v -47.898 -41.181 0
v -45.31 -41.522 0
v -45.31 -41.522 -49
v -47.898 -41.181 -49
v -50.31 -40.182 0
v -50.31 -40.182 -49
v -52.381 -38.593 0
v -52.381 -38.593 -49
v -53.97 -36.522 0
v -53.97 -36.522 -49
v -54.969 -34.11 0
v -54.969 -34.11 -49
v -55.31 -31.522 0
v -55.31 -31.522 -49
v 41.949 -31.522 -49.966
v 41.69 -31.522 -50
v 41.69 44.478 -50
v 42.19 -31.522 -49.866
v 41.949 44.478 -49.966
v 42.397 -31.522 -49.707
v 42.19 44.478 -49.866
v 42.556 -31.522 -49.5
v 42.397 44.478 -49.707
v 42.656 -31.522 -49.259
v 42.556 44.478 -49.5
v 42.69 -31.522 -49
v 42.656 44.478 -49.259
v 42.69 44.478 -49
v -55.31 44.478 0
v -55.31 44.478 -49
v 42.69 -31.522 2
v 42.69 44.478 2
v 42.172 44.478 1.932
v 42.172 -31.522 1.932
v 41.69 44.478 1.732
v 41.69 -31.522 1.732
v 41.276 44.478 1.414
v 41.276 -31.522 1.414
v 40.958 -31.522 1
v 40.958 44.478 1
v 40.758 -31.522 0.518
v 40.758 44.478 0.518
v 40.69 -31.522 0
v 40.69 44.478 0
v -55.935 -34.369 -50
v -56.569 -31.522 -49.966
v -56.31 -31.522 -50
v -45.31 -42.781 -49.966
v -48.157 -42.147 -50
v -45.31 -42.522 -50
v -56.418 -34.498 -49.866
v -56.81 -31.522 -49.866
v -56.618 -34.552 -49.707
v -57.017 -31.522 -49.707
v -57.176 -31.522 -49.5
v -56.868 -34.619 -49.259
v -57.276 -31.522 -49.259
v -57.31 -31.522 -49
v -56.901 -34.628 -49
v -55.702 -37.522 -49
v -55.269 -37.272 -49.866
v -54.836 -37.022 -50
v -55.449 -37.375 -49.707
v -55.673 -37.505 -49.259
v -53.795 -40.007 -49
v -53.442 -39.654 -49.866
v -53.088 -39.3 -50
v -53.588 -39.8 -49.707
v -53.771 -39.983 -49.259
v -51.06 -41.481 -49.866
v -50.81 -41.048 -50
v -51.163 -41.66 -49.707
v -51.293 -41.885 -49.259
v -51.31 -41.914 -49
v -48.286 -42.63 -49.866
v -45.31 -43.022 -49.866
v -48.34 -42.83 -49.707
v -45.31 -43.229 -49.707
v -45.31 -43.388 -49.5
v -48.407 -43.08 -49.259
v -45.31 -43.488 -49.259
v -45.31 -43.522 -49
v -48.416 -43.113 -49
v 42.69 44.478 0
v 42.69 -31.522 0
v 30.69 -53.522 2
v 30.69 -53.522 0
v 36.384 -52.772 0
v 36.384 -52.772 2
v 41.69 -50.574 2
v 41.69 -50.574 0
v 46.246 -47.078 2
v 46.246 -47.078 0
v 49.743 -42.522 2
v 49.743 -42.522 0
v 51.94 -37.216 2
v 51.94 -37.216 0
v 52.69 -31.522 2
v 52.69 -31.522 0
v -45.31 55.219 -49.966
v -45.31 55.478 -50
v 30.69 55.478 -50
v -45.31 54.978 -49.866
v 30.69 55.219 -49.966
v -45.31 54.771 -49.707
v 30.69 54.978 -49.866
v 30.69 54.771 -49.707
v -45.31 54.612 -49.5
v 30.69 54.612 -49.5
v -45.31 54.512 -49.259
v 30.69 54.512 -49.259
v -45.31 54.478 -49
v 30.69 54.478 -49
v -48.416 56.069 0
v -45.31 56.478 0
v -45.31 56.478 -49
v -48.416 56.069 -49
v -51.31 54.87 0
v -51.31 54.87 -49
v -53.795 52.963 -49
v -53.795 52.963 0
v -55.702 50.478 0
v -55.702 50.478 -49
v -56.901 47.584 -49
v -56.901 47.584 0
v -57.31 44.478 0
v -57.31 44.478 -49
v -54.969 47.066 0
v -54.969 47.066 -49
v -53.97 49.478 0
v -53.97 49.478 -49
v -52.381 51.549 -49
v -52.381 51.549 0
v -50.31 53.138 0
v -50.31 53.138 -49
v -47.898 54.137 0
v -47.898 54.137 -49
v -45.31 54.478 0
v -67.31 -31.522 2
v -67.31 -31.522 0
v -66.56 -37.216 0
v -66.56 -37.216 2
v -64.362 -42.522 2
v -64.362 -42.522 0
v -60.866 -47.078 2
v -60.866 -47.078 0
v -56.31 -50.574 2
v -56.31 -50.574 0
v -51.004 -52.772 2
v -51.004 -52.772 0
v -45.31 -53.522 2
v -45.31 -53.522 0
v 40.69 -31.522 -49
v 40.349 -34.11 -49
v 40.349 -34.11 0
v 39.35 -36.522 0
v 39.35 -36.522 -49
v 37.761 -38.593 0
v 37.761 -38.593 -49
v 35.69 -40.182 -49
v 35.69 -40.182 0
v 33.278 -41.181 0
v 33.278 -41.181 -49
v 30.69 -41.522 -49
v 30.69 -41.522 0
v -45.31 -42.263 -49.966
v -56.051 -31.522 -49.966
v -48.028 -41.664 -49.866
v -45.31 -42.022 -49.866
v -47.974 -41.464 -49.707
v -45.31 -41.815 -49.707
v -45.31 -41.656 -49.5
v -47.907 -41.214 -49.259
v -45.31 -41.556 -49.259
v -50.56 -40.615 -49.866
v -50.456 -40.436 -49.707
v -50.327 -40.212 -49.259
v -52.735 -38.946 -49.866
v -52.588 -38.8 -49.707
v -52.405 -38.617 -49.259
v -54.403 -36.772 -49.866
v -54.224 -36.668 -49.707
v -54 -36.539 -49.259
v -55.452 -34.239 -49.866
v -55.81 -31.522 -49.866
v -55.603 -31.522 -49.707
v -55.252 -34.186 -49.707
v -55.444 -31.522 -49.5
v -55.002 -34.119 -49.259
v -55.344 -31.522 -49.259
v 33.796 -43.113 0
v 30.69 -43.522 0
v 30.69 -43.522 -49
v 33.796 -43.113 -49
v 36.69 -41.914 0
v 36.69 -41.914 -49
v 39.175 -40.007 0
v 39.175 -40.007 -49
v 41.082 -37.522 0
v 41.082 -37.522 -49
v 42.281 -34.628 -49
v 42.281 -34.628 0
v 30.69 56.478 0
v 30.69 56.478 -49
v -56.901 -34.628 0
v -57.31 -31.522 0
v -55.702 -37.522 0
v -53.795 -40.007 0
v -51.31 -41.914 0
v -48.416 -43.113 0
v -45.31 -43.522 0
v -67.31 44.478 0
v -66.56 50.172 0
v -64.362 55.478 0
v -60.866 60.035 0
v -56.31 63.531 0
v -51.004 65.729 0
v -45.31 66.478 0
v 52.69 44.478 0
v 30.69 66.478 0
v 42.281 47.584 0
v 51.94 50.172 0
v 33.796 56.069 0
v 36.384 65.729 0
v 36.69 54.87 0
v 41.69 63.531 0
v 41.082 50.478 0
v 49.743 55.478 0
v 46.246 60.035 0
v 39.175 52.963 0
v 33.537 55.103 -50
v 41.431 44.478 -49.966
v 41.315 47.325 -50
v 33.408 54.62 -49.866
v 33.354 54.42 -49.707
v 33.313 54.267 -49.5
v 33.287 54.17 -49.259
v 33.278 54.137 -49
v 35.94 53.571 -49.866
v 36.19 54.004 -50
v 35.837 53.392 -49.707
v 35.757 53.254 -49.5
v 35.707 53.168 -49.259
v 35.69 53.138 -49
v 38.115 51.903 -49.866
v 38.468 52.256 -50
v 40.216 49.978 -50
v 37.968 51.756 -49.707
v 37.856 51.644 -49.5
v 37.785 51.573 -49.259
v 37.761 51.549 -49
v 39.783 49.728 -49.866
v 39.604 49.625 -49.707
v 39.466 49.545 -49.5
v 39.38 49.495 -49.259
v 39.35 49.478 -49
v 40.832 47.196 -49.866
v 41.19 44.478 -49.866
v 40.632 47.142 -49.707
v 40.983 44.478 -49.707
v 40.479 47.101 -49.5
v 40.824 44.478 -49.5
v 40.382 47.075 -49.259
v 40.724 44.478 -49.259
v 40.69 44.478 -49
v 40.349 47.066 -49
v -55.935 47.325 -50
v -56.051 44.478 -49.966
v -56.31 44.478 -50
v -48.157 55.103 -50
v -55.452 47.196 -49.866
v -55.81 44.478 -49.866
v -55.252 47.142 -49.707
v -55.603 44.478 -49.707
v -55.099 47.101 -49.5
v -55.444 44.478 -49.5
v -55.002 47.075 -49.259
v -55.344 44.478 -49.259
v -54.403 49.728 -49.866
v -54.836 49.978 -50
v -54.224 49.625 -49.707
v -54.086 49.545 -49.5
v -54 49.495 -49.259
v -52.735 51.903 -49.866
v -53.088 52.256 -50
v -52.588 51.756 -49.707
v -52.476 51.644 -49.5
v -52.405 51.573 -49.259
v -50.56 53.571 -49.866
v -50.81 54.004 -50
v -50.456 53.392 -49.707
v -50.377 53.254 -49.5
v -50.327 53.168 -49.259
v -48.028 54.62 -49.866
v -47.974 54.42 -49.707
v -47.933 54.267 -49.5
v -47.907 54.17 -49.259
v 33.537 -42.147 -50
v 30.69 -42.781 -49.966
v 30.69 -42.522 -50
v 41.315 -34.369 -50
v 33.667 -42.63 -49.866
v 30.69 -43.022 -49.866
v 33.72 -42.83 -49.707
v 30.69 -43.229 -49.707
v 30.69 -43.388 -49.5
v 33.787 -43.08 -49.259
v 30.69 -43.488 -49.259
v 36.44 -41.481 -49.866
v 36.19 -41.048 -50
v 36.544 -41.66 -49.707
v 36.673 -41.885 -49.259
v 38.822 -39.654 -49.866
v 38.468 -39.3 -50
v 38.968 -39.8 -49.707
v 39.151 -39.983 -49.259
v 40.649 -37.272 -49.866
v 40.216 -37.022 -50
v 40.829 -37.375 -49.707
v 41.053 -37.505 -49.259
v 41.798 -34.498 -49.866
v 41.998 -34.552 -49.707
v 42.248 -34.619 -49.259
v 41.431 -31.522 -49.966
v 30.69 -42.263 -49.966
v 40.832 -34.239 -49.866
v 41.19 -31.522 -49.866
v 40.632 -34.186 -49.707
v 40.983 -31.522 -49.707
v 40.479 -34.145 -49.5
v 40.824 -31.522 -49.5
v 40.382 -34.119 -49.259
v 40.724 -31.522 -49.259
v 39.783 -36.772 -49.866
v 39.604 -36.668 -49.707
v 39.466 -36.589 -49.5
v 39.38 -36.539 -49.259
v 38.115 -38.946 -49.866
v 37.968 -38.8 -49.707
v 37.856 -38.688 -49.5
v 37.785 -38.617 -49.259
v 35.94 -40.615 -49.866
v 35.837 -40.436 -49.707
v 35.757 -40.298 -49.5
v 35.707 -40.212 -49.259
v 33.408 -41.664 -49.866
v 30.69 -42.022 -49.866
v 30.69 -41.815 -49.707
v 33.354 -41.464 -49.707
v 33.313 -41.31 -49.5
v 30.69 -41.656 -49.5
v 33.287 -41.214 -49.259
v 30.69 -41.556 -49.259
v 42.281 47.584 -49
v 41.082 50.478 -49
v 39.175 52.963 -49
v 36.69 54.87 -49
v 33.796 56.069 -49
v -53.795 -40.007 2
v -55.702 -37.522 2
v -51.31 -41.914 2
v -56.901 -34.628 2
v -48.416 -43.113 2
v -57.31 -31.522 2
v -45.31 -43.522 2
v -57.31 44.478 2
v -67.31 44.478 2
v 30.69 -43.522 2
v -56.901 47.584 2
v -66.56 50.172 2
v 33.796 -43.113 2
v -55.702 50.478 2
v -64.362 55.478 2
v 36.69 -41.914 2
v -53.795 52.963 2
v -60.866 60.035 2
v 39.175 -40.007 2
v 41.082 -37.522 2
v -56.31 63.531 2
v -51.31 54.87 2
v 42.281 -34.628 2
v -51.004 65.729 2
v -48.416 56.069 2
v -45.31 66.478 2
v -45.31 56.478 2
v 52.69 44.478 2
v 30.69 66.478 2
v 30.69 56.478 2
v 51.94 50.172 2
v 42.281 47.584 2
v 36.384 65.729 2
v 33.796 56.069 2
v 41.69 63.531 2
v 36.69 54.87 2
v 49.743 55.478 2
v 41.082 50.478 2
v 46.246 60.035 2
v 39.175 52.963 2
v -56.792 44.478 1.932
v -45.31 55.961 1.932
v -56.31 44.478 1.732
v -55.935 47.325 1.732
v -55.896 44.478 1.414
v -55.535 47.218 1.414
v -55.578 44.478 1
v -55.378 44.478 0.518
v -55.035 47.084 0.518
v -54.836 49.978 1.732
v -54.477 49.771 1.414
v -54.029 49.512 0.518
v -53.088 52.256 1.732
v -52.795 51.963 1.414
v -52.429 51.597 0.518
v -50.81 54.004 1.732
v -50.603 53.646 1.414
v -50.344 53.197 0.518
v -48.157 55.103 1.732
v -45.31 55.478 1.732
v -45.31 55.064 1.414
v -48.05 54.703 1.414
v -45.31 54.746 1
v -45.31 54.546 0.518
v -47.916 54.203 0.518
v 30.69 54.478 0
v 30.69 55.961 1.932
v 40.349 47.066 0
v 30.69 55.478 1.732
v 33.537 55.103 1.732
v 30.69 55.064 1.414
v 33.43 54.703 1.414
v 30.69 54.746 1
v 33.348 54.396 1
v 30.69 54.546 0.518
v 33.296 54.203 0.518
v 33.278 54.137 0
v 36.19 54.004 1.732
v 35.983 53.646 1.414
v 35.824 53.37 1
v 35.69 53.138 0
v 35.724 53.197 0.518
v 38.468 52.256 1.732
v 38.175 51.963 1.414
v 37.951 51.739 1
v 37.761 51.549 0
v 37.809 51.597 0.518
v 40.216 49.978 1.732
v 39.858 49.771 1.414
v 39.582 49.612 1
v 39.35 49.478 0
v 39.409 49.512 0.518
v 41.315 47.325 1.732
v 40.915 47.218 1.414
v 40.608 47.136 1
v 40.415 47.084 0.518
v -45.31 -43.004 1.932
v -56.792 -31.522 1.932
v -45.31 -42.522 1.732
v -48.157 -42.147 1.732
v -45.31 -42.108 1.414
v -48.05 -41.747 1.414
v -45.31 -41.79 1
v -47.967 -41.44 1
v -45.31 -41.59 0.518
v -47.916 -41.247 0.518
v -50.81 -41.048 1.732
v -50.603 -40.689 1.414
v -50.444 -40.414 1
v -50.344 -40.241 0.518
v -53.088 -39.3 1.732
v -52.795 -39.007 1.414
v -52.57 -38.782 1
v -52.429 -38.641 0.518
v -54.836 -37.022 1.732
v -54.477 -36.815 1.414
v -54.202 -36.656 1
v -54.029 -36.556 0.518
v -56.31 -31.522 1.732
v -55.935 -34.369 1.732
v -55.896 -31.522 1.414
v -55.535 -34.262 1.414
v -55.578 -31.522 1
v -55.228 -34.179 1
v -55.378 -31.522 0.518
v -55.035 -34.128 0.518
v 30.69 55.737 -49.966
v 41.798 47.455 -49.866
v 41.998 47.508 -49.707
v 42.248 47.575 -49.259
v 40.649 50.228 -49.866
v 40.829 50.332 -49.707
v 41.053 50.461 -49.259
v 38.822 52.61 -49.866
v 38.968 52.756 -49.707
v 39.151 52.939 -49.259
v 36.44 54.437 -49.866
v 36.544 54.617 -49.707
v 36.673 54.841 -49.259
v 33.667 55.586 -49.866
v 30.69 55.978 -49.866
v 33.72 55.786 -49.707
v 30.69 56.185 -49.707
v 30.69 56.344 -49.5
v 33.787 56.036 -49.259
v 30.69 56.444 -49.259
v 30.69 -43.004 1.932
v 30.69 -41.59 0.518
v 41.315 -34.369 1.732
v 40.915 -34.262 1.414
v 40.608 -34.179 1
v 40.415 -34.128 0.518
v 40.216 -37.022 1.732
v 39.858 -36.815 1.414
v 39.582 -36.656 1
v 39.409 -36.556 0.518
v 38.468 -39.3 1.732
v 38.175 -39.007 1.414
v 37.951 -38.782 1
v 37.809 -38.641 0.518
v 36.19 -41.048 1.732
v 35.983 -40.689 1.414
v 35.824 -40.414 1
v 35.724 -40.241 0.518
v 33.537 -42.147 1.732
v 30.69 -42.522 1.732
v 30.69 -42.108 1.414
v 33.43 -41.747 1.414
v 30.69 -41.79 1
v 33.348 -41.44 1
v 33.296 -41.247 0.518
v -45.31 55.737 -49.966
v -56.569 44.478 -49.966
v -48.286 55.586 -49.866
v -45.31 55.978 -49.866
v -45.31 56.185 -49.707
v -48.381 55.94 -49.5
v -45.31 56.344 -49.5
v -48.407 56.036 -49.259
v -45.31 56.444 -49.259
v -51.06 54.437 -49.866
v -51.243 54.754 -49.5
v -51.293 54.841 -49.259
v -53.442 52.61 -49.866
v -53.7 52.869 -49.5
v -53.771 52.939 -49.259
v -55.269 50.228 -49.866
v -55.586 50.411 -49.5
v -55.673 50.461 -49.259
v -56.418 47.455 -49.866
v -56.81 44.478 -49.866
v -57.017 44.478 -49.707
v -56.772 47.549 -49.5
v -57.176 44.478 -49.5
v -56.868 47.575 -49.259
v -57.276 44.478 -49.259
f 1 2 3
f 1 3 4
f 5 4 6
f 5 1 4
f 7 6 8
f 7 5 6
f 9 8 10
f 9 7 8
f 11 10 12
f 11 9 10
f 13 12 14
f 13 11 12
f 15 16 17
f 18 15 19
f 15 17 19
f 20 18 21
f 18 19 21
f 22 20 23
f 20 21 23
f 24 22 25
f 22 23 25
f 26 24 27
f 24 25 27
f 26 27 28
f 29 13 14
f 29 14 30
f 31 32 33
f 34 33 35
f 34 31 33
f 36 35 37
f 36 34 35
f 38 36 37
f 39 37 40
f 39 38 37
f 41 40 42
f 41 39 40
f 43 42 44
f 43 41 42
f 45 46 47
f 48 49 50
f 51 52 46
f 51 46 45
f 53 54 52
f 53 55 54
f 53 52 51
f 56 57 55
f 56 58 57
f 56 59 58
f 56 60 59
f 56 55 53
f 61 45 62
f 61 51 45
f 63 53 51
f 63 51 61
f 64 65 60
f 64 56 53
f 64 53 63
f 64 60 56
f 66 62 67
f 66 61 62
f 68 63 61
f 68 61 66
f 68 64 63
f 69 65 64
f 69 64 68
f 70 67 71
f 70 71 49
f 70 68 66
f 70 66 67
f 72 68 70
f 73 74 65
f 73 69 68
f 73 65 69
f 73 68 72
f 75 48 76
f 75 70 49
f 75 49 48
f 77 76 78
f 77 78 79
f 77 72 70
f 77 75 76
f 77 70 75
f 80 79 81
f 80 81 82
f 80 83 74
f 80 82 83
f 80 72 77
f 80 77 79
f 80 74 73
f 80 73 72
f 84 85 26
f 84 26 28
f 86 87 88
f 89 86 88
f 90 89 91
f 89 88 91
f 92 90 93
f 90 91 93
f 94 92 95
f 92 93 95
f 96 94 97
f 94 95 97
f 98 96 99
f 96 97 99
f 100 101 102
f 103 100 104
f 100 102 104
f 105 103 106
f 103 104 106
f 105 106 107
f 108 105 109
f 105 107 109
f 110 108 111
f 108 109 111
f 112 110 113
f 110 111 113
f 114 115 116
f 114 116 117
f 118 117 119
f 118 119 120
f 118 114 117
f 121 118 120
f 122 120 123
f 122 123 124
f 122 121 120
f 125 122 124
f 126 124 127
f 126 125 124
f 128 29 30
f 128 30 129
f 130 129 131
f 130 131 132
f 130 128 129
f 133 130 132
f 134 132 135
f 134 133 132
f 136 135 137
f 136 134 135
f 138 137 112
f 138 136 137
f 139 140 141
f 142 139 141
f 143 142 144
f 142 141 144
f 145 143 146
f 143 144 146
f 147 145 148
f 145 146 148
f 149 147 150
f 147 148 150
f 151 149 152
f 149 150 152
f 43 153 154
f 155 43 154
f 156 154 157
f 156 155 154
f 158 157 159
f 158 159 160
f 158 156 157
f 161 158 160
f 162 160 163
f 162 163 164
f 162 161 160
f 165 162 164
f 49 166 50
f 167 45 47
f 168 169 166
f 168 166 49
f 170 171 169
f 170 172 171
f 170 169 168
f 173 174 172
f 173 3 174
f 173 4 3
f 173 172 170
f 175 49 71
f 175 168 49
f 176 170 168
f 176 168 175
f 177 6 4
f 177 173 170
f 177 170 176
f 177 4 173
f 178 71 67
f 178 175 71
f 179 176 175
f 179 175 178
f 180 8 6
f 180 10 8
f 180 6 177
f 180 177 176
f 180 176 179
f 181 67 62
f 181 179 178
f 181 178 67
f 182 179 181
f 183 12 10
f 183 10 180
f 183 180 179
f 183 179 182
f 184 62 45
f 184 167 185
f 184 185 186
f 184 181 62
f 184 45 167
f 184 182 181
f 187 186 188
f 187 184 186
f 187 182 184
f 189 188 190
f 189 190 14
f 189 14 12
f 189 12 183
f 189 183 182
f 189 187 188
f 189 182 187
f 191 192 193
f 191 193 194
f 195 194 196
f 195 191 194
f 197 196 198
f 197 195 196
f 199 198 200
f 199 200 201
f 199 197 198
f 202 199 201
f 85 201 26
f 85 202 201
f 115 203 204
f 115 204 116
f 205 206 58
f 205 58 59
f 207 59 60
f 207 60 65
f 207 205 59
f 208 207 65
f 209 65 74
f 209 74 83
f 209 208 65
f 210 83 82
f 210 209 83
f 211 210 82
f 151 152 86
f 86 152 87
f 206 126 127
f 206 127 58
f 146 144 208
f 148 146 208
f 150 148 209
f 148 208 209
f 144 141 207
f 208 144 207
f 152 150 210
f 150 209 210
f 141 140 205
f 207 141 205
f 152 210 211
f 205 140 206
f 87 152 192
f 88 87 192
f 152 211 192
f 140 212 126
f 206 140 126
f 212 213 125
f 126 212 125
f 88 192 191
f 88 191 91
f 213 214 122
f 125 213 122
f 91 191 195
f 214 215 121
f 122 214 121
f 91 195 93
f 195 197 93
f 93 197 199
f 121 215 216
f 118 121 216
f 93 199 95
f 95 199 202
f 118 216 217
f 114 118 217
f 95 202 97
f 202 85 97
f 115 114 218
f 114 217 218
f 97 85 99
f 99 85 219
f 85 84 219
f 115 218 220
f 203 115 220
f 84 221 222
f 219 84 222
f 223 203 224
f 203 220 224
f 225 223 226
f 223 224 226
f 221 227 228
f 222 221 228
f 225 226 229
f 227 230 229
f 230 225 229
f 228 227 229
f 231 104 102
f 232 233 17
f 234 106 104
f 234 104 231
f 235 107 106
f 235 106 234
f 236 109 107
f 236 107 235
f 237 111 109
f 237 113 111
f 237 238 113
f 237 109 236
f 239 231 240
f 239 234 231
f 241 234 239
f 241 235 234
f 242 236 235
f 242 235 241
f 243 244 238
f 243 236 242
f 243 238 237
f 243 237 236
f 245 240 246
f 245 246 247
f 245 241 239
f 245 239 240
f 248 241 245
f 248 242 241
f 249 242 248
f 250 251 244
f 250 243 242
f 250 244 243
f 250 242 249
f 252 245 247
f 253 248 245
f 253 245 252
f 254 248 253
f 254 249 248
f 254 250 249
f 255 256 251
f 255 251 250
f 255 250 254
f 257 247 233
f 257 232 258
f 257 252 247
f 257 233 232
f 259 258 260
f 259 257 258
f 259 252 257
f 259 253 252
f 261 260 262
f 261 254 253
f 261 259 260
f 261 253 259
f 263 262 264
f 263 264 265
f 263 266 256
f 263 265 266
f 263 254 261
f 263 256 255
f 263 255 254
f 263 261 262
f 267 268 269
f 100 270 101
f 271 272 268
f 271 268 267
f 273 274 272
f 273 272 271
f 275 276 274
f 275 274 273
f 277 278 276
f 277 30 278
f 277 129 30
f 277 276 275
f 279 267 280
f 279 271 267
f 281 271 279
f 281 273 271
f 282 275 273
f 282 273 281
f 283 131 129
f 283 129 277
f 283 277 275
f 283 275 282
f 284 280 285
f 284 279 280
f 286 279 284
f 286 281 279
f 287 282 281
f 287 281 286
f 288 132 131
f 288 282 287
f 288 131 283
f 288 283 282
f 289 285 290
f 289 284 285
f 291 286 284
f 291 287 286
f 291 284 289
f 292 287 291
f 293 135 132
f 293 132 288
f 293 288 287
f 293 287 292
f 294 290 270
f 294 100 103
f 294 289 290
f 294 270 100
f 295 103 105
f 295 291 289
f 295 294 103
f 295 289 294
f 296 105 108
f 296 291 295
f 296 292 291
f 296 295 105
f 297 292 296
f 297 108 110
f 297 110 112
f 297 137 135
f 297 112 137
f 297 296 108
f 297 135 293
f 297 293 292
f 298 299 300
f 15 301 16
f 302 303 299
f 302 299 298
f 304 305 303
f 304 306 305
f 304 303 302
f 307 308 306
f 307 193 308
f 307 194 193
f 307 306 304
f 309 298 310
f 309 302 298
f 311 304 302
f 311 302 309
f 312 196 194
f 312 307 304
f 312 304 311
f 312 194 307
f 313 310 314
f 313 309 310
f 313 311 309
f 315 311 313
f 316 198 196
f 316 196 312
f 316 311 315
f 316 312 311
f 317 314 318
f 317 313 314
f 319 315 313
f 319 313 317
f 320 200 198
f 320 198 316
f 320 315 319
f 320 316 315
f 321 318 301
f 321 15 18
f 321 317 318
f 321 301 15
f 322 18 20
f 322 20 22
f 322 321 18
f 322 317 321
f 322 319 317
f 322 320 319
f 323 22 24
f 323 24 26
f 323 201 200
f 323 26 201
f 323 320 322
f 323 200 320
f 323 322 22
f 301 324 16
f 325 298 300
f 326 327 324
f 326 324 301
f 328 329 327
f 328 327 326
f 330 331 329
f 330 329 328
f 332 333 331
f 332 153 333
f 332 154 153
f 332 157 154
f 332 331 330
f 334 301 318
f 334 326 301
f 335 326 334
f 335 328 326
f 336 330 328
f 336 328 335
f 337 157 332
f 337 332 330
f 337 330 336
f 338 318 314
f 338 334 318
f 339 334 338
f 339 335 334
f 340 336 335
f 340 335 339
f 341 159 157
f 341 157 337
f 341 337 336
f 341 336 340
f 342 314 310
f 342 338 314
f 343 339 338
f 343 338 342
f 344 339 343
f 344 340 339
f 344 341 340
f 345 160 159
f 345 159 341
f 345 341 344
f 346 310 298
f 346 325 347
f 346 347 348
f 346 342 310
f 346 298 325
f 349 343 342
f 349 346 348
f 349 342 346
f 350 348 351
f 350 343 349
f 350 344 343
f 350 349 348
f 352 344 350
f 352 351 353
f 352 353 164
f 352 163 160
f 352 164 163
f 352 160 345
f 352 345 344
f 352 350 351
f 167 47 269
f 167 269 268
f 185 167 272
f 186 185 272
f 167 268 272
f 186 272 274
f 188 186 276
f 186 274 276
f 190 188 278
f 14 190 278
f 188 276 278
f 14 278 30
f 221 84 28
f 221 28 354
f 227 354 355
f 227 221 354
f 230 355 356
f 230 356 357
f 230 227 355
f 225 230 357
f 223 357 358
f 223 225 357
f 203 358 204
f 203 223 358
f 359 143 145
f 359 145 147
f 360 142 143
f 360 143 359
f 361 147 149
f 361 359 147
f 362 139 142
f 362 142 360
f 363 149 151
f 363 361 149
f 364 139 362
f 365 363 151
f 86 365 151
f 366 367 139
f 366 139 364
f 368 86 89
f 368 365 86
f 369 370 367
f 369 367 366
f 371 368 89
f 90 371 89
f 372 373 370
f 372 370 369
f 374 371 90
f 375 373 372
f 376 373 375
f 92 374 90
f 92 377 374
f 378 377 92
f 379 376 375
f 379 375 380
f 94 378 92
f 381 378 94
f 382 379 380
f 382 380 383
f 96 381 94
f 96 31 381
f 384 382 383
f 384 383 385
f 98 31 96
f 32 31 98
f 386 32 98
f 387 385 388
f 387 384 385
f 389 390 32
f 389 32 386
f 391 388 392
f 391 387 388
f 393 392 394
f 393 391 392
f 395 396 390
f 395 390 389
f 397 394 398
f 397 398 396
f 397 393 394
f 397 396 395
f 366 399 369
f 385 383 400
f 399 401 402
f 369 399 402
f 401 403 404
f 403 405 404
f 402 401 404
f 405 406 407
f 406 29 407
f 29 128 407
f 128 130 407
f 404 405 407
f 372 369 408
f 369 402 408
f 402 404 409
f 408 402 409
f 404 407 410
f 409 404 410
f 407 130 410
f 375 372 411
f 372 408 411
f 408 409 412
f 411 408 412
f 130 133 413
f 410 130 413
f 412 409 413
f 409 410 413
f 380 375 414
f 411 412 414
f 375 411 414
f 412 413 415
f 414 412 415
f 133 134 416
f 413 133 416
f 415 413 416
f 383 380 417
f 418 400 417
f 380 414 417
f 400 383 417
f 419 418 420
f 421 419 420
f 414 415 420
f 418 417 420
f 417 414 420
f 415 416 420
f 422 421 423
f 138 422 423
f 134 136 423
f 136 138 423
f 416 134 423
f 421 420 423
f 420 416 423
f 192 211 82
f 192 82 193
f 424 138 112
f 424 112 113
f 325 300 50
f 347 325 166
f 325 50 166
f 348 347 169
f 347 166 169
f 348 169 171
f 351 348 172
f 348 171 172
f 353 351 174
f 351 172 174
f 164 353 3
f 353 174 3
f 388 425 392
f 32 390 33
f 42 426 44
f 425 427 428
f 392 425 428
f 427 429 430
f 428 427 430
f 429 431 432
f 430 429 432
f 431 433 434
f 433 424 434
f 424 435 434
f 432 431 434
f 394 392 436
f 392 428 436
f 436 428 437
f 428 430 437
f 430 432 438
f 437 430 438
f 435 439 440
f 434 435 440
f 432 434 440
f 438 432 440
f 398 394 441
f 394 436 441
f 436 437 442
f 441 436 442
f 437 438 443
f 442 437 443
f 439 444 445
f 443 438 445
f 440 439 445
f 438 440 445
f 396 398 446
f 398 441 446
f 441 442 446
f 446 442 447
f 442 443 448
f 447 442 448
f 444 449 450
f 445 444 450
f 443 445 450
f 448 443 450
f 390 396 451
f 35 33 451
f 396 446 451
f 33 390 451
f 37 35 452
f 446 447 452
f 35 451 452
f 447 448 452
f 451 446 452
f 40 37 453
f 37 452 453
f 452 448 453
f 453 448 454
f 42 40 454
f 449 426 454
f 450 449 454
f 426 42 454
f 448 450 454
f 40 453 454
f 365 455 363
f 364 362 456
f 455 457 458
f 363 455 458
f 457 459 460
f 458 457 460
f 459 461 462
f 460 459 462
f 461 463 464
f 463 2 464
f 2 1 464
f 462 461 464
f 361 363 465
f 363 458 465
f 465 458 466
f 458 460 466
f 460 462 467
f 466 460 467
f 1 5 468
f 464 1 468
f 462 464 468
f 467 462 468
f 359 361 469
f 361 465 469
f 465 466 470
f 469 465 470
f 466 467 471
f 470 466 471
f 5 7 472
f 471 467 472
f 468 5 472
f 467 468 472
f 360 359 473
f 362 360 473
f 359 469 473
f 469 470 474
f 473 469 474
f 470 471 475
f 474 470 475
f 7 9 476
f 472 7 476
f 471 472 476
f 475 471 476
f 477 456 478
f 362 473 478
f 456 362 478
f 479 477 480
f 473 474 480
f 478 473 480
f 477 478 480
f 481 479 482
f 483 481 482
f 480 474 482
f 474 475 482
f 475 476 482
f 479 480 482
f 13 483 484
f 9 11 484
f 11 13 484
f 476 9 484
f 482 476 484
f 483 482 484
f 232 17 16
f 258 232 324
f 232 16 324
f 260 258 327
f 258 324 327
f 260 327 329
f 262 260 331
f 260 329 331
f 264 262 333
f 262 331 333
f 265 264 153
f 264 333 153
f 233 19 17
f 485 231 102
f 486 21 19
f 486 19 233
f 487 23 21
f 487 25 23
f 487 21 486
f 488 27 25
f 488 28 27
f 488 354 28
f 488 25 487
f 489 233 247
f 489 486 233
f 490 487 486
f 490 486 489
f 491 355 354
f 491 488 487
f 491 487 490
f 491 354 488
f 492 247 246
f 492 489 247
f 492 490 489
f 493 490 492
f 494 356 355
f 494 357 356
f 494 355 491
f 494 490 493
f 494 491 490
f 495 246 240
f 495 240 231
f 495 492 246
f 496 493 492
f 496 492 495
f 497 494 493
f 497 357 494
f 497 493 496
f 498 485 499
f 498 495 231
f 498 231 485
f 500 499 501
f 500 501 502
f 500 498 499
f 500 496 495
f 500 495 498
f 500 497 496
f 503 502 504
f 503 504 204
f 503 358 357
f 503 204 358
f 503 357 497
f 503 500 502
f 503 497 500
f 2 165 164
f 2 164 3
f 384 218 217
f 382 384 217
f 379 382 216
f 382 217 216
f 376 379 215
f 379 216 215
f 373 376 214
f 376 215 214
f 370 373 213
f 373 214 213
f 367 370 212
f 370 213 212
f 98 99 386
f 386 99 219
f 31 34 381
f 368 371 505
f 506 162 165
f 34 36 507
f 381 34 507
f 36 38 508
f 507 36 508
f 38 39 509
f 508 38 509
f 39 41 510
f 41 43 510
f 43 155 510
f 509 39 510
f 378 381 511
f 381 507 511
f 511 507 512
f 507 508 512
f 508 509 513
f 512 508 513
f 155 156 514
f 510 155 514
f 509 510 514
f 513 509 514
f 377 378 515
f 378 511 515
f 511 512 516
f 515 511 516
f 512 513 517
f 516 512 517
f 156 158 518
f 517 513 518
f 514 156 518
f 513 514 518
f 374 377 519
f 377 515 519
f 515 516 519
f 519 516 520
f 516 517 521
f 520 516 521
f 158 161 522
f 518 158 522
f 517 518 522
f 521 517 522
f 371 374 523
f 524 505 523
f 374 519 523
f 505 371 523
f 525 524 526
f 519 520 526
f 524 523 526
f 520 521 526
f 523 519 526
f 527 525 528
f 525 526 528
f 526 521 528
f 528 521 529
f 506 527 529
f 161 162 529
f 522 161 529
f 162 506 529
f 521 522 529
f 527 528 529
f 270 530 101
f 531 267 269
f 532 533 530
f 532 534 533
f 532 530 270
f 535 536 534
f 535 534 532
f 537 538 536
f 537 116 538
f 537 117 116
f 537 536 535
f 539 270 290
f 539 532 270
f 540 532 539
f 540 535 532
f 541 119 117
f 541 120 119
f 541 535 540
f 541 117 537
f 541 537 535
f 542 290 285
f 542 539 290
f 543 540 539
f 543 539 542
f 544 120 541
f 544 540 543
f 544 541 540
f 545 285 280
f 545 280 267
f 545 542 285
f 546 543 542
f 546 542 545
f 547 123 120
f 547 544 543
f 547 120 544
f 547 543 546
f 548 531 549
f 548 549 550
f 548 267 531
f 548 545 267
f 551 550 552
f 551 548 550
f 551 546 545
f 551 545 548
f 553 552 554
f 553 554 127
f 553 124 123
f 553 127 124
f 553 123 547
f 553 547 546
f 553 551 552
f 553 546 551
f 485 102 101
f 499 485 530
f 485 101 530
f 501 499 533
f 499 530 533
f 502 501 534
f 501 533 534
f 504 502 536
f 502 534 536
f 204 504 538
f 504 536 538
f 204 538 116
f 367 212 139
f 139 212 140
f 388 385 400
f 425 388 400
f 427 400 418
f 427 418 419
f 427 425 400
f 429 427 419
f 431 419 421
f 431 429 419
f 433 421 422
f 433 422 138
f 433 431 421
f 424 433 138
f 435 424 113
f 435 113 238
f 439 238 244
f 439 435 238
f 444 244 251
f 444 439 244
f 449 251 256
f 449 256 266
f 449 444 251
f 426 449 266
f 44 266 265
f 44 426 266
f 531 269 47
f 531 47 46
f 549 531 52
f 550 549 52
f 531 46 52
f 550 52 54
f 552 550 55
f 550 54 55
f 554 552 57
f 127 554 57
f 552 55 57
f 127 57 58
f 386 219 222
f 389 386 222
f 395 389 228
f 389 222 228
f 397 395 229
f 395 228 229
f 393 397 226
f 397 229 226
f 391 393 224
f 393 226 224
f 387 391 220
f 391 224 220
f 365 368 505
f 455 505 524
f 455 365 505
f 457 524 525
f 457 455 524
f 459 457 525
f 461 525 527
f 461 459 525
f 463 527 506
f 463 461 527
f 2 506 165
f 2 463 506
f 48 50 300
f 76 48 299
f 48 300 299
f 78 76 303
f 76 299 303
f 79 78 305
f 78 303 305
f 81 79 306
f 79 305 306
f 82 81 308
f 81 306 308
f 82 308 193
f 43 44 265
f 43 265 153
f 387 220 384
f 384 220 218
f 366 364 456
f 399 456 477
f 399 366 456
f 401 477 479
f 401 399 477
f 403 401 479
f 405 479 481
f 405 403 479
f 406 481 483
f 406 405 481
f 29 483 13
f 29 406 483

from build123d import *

# Parameters (mm, degrees)
F1_DEPTH = 2
F3_DEPTH = 50
F4_R     = 0.99999
F5_R     = 2


# Not quite as in the source:
# - a fillet or chamfer is up to 0.001 mm smaller than in the source, because OpenCascade refuses the exact size


with BuildPart() as f1:
    # F0 (on Top) → F1 (new body)
    with BuildSketch(Plane.XY):
        with BuildLine():
            Line((-67.3099028766, 44.4781833887), (-67.3099028766, -31.5218166113))
            ThreePointArc((-67.3099028766, -31.5218166113), (-60.8662520627, -47.0781657974), (-45.3099028766, -53.5218166113))
            Line((-45.3099028766, -53.5218166113), (30.6900971234, -53.5218166113))
            ThreePointArc((30.6900971234, -53.5218166113), (46.2464463095, -47.0781657974), (52.6900971234, -31.5218166113))
            Line((52.6900971234, -31.5218166113), (52.6900971234, 44.4781833887))
            ThreePointArc((52.6900971234, 44.4781833887), (46.2464463095, 60.0345325748), (30.6900971234, 66.4781833887))
            Line((30.6900971234, 66.4781833887), (-45.3099028766, 66.4781833887))
            ThreePointArc((-45.3099028766, 66.4781833887), (-60.8662520627, 60.0345325748), (-67.3099028766, 44.4781833887))
        make_face()
        with BuildLine():
            ThreePointArc((-55.3099028766, 44.4781833887), (-52.3809706885, 51.5492512006), (-45.3099028766, 54.4781833887))
            Line((-45.3099028766, 54.4781833887), (30.6900971234, 54.4781833887))
            ThreePointArc((30.6900971234, 54.4781833887), (37.7611649352, 51.5492512006), (40.6900971234, 44.4781833887))
            Line((40.6900971234, 44.4781833887), (40.6900971234, -31.5218166113))
            ThreePointArc((40.6900971234, -31.5218166113), (37.7611649352, -38.5928844232), (30.6900971234, -41.5218166113))
            Line((30.6900971234, -41.5218166113), (-45.3099028766, -41.5218166113))
            ThreePointArc((-45.3099028766, -41.5218166113), (-52.3809706885, -38.5928844232), (-55.3099028766, -31.5218166113))
            Line((-55.3099028766, -31.5218166113), (-55.3099028766, 44.4781833887))
        make_face(mode=Mode.SUBTRACT)
    extrude(amount=F1_DEPTH)

    # F2 (on Top) → F3 (join)
    with BuildSketch(Plane.XY):
        with BuildLine():
            Line((-45.3099028766, -43.5218166113), (30.6900971234, -43.5218166113))
            ThreePointArc((30.6900971234, -43.5218166113), (39.1753784976, -40.0070979855), (42.6900971234, -31.5218166113))
            Line((42.6900971234, -31.5218166113), (42.6900971234, 44.4781833887))
            ThreePointArc((42.6900971234, 44.4781833887), (39.1753784976, 52.9634647629), (30.6900971234, 56.4781833887))
            Line((30.6900971234, 56.4781833887), (-45.3099028766, 56.4781833887))
            ThreePointArc((-45.3099028766, 56.4781833887), (-53.7951842509, 52.9634647629), (-57.3099028766, 44.4781833887))
            Line((-57.3099028766, 44.4781833887), (-57.3099028766, -31.5218166113))
            ThreePointArc((-57.3099028766, -31.5218166113), (-53.7951842509, -40.0070979855), (-45.3099028766, -43.5218166113))
        make_face()
        with BuildLine():
            Line((-45.3099028766, 54.4781833887), (30.6900971234, 54.4781833887))
            ThreePointArc((30.6900971234, 54.4781833887), (37.7611649352, 51.5492512006), (40.6900971234, 44.4781833887))
            Line((40.6900971234, 44.4781833887), (40.6900971234, -31.5218166113))
            ThreePointArc((40.6900971234, -31.5218166113), (37.7611649352, -38.5928844232), (30.6900971234, -41.5218166113))
            Line((30.6900971234, -41.5218166113), (-45.3099028766, -41.5218166113))
            ThreePointArc((-45.3099028766, -41.5218166113), (-52.3809706885, -38.5928844232), (-55.3099028766, -31.5218166113))
            Line((-55.3099028766, -31.5218166113), (-55.3099028766, 44.4781833887))
            ThreePointArc((-55.3099028766, 44.4781833887), (-52.3809706885, 51.5492512006), (-45.3099028766, 54.4781833887))
        make_face(mode=Mode.SUBTRACT)
    extrude(amount=-F3_DEPTH)

    # F4 (radius 1 in the source; OpenCascade refuses exactly that, so slightly less here)
    f4_edges = [f1.edges().sort_by_distance(p)[0] for p in [
        (-55.309903, 6.478183, -50),
        (-57.309903, 6.478183, -50),
    ]]
    fillet(f4_edges, radius=F4_R)

    # F5
    f5_edges = [f1.edges().sort_by_distance(p)[0] for p in [
        (-7.309903, 54.478183, 2),
    ]]
    fillet(f5_edges, radius=F5_R)


solid = f1.part
